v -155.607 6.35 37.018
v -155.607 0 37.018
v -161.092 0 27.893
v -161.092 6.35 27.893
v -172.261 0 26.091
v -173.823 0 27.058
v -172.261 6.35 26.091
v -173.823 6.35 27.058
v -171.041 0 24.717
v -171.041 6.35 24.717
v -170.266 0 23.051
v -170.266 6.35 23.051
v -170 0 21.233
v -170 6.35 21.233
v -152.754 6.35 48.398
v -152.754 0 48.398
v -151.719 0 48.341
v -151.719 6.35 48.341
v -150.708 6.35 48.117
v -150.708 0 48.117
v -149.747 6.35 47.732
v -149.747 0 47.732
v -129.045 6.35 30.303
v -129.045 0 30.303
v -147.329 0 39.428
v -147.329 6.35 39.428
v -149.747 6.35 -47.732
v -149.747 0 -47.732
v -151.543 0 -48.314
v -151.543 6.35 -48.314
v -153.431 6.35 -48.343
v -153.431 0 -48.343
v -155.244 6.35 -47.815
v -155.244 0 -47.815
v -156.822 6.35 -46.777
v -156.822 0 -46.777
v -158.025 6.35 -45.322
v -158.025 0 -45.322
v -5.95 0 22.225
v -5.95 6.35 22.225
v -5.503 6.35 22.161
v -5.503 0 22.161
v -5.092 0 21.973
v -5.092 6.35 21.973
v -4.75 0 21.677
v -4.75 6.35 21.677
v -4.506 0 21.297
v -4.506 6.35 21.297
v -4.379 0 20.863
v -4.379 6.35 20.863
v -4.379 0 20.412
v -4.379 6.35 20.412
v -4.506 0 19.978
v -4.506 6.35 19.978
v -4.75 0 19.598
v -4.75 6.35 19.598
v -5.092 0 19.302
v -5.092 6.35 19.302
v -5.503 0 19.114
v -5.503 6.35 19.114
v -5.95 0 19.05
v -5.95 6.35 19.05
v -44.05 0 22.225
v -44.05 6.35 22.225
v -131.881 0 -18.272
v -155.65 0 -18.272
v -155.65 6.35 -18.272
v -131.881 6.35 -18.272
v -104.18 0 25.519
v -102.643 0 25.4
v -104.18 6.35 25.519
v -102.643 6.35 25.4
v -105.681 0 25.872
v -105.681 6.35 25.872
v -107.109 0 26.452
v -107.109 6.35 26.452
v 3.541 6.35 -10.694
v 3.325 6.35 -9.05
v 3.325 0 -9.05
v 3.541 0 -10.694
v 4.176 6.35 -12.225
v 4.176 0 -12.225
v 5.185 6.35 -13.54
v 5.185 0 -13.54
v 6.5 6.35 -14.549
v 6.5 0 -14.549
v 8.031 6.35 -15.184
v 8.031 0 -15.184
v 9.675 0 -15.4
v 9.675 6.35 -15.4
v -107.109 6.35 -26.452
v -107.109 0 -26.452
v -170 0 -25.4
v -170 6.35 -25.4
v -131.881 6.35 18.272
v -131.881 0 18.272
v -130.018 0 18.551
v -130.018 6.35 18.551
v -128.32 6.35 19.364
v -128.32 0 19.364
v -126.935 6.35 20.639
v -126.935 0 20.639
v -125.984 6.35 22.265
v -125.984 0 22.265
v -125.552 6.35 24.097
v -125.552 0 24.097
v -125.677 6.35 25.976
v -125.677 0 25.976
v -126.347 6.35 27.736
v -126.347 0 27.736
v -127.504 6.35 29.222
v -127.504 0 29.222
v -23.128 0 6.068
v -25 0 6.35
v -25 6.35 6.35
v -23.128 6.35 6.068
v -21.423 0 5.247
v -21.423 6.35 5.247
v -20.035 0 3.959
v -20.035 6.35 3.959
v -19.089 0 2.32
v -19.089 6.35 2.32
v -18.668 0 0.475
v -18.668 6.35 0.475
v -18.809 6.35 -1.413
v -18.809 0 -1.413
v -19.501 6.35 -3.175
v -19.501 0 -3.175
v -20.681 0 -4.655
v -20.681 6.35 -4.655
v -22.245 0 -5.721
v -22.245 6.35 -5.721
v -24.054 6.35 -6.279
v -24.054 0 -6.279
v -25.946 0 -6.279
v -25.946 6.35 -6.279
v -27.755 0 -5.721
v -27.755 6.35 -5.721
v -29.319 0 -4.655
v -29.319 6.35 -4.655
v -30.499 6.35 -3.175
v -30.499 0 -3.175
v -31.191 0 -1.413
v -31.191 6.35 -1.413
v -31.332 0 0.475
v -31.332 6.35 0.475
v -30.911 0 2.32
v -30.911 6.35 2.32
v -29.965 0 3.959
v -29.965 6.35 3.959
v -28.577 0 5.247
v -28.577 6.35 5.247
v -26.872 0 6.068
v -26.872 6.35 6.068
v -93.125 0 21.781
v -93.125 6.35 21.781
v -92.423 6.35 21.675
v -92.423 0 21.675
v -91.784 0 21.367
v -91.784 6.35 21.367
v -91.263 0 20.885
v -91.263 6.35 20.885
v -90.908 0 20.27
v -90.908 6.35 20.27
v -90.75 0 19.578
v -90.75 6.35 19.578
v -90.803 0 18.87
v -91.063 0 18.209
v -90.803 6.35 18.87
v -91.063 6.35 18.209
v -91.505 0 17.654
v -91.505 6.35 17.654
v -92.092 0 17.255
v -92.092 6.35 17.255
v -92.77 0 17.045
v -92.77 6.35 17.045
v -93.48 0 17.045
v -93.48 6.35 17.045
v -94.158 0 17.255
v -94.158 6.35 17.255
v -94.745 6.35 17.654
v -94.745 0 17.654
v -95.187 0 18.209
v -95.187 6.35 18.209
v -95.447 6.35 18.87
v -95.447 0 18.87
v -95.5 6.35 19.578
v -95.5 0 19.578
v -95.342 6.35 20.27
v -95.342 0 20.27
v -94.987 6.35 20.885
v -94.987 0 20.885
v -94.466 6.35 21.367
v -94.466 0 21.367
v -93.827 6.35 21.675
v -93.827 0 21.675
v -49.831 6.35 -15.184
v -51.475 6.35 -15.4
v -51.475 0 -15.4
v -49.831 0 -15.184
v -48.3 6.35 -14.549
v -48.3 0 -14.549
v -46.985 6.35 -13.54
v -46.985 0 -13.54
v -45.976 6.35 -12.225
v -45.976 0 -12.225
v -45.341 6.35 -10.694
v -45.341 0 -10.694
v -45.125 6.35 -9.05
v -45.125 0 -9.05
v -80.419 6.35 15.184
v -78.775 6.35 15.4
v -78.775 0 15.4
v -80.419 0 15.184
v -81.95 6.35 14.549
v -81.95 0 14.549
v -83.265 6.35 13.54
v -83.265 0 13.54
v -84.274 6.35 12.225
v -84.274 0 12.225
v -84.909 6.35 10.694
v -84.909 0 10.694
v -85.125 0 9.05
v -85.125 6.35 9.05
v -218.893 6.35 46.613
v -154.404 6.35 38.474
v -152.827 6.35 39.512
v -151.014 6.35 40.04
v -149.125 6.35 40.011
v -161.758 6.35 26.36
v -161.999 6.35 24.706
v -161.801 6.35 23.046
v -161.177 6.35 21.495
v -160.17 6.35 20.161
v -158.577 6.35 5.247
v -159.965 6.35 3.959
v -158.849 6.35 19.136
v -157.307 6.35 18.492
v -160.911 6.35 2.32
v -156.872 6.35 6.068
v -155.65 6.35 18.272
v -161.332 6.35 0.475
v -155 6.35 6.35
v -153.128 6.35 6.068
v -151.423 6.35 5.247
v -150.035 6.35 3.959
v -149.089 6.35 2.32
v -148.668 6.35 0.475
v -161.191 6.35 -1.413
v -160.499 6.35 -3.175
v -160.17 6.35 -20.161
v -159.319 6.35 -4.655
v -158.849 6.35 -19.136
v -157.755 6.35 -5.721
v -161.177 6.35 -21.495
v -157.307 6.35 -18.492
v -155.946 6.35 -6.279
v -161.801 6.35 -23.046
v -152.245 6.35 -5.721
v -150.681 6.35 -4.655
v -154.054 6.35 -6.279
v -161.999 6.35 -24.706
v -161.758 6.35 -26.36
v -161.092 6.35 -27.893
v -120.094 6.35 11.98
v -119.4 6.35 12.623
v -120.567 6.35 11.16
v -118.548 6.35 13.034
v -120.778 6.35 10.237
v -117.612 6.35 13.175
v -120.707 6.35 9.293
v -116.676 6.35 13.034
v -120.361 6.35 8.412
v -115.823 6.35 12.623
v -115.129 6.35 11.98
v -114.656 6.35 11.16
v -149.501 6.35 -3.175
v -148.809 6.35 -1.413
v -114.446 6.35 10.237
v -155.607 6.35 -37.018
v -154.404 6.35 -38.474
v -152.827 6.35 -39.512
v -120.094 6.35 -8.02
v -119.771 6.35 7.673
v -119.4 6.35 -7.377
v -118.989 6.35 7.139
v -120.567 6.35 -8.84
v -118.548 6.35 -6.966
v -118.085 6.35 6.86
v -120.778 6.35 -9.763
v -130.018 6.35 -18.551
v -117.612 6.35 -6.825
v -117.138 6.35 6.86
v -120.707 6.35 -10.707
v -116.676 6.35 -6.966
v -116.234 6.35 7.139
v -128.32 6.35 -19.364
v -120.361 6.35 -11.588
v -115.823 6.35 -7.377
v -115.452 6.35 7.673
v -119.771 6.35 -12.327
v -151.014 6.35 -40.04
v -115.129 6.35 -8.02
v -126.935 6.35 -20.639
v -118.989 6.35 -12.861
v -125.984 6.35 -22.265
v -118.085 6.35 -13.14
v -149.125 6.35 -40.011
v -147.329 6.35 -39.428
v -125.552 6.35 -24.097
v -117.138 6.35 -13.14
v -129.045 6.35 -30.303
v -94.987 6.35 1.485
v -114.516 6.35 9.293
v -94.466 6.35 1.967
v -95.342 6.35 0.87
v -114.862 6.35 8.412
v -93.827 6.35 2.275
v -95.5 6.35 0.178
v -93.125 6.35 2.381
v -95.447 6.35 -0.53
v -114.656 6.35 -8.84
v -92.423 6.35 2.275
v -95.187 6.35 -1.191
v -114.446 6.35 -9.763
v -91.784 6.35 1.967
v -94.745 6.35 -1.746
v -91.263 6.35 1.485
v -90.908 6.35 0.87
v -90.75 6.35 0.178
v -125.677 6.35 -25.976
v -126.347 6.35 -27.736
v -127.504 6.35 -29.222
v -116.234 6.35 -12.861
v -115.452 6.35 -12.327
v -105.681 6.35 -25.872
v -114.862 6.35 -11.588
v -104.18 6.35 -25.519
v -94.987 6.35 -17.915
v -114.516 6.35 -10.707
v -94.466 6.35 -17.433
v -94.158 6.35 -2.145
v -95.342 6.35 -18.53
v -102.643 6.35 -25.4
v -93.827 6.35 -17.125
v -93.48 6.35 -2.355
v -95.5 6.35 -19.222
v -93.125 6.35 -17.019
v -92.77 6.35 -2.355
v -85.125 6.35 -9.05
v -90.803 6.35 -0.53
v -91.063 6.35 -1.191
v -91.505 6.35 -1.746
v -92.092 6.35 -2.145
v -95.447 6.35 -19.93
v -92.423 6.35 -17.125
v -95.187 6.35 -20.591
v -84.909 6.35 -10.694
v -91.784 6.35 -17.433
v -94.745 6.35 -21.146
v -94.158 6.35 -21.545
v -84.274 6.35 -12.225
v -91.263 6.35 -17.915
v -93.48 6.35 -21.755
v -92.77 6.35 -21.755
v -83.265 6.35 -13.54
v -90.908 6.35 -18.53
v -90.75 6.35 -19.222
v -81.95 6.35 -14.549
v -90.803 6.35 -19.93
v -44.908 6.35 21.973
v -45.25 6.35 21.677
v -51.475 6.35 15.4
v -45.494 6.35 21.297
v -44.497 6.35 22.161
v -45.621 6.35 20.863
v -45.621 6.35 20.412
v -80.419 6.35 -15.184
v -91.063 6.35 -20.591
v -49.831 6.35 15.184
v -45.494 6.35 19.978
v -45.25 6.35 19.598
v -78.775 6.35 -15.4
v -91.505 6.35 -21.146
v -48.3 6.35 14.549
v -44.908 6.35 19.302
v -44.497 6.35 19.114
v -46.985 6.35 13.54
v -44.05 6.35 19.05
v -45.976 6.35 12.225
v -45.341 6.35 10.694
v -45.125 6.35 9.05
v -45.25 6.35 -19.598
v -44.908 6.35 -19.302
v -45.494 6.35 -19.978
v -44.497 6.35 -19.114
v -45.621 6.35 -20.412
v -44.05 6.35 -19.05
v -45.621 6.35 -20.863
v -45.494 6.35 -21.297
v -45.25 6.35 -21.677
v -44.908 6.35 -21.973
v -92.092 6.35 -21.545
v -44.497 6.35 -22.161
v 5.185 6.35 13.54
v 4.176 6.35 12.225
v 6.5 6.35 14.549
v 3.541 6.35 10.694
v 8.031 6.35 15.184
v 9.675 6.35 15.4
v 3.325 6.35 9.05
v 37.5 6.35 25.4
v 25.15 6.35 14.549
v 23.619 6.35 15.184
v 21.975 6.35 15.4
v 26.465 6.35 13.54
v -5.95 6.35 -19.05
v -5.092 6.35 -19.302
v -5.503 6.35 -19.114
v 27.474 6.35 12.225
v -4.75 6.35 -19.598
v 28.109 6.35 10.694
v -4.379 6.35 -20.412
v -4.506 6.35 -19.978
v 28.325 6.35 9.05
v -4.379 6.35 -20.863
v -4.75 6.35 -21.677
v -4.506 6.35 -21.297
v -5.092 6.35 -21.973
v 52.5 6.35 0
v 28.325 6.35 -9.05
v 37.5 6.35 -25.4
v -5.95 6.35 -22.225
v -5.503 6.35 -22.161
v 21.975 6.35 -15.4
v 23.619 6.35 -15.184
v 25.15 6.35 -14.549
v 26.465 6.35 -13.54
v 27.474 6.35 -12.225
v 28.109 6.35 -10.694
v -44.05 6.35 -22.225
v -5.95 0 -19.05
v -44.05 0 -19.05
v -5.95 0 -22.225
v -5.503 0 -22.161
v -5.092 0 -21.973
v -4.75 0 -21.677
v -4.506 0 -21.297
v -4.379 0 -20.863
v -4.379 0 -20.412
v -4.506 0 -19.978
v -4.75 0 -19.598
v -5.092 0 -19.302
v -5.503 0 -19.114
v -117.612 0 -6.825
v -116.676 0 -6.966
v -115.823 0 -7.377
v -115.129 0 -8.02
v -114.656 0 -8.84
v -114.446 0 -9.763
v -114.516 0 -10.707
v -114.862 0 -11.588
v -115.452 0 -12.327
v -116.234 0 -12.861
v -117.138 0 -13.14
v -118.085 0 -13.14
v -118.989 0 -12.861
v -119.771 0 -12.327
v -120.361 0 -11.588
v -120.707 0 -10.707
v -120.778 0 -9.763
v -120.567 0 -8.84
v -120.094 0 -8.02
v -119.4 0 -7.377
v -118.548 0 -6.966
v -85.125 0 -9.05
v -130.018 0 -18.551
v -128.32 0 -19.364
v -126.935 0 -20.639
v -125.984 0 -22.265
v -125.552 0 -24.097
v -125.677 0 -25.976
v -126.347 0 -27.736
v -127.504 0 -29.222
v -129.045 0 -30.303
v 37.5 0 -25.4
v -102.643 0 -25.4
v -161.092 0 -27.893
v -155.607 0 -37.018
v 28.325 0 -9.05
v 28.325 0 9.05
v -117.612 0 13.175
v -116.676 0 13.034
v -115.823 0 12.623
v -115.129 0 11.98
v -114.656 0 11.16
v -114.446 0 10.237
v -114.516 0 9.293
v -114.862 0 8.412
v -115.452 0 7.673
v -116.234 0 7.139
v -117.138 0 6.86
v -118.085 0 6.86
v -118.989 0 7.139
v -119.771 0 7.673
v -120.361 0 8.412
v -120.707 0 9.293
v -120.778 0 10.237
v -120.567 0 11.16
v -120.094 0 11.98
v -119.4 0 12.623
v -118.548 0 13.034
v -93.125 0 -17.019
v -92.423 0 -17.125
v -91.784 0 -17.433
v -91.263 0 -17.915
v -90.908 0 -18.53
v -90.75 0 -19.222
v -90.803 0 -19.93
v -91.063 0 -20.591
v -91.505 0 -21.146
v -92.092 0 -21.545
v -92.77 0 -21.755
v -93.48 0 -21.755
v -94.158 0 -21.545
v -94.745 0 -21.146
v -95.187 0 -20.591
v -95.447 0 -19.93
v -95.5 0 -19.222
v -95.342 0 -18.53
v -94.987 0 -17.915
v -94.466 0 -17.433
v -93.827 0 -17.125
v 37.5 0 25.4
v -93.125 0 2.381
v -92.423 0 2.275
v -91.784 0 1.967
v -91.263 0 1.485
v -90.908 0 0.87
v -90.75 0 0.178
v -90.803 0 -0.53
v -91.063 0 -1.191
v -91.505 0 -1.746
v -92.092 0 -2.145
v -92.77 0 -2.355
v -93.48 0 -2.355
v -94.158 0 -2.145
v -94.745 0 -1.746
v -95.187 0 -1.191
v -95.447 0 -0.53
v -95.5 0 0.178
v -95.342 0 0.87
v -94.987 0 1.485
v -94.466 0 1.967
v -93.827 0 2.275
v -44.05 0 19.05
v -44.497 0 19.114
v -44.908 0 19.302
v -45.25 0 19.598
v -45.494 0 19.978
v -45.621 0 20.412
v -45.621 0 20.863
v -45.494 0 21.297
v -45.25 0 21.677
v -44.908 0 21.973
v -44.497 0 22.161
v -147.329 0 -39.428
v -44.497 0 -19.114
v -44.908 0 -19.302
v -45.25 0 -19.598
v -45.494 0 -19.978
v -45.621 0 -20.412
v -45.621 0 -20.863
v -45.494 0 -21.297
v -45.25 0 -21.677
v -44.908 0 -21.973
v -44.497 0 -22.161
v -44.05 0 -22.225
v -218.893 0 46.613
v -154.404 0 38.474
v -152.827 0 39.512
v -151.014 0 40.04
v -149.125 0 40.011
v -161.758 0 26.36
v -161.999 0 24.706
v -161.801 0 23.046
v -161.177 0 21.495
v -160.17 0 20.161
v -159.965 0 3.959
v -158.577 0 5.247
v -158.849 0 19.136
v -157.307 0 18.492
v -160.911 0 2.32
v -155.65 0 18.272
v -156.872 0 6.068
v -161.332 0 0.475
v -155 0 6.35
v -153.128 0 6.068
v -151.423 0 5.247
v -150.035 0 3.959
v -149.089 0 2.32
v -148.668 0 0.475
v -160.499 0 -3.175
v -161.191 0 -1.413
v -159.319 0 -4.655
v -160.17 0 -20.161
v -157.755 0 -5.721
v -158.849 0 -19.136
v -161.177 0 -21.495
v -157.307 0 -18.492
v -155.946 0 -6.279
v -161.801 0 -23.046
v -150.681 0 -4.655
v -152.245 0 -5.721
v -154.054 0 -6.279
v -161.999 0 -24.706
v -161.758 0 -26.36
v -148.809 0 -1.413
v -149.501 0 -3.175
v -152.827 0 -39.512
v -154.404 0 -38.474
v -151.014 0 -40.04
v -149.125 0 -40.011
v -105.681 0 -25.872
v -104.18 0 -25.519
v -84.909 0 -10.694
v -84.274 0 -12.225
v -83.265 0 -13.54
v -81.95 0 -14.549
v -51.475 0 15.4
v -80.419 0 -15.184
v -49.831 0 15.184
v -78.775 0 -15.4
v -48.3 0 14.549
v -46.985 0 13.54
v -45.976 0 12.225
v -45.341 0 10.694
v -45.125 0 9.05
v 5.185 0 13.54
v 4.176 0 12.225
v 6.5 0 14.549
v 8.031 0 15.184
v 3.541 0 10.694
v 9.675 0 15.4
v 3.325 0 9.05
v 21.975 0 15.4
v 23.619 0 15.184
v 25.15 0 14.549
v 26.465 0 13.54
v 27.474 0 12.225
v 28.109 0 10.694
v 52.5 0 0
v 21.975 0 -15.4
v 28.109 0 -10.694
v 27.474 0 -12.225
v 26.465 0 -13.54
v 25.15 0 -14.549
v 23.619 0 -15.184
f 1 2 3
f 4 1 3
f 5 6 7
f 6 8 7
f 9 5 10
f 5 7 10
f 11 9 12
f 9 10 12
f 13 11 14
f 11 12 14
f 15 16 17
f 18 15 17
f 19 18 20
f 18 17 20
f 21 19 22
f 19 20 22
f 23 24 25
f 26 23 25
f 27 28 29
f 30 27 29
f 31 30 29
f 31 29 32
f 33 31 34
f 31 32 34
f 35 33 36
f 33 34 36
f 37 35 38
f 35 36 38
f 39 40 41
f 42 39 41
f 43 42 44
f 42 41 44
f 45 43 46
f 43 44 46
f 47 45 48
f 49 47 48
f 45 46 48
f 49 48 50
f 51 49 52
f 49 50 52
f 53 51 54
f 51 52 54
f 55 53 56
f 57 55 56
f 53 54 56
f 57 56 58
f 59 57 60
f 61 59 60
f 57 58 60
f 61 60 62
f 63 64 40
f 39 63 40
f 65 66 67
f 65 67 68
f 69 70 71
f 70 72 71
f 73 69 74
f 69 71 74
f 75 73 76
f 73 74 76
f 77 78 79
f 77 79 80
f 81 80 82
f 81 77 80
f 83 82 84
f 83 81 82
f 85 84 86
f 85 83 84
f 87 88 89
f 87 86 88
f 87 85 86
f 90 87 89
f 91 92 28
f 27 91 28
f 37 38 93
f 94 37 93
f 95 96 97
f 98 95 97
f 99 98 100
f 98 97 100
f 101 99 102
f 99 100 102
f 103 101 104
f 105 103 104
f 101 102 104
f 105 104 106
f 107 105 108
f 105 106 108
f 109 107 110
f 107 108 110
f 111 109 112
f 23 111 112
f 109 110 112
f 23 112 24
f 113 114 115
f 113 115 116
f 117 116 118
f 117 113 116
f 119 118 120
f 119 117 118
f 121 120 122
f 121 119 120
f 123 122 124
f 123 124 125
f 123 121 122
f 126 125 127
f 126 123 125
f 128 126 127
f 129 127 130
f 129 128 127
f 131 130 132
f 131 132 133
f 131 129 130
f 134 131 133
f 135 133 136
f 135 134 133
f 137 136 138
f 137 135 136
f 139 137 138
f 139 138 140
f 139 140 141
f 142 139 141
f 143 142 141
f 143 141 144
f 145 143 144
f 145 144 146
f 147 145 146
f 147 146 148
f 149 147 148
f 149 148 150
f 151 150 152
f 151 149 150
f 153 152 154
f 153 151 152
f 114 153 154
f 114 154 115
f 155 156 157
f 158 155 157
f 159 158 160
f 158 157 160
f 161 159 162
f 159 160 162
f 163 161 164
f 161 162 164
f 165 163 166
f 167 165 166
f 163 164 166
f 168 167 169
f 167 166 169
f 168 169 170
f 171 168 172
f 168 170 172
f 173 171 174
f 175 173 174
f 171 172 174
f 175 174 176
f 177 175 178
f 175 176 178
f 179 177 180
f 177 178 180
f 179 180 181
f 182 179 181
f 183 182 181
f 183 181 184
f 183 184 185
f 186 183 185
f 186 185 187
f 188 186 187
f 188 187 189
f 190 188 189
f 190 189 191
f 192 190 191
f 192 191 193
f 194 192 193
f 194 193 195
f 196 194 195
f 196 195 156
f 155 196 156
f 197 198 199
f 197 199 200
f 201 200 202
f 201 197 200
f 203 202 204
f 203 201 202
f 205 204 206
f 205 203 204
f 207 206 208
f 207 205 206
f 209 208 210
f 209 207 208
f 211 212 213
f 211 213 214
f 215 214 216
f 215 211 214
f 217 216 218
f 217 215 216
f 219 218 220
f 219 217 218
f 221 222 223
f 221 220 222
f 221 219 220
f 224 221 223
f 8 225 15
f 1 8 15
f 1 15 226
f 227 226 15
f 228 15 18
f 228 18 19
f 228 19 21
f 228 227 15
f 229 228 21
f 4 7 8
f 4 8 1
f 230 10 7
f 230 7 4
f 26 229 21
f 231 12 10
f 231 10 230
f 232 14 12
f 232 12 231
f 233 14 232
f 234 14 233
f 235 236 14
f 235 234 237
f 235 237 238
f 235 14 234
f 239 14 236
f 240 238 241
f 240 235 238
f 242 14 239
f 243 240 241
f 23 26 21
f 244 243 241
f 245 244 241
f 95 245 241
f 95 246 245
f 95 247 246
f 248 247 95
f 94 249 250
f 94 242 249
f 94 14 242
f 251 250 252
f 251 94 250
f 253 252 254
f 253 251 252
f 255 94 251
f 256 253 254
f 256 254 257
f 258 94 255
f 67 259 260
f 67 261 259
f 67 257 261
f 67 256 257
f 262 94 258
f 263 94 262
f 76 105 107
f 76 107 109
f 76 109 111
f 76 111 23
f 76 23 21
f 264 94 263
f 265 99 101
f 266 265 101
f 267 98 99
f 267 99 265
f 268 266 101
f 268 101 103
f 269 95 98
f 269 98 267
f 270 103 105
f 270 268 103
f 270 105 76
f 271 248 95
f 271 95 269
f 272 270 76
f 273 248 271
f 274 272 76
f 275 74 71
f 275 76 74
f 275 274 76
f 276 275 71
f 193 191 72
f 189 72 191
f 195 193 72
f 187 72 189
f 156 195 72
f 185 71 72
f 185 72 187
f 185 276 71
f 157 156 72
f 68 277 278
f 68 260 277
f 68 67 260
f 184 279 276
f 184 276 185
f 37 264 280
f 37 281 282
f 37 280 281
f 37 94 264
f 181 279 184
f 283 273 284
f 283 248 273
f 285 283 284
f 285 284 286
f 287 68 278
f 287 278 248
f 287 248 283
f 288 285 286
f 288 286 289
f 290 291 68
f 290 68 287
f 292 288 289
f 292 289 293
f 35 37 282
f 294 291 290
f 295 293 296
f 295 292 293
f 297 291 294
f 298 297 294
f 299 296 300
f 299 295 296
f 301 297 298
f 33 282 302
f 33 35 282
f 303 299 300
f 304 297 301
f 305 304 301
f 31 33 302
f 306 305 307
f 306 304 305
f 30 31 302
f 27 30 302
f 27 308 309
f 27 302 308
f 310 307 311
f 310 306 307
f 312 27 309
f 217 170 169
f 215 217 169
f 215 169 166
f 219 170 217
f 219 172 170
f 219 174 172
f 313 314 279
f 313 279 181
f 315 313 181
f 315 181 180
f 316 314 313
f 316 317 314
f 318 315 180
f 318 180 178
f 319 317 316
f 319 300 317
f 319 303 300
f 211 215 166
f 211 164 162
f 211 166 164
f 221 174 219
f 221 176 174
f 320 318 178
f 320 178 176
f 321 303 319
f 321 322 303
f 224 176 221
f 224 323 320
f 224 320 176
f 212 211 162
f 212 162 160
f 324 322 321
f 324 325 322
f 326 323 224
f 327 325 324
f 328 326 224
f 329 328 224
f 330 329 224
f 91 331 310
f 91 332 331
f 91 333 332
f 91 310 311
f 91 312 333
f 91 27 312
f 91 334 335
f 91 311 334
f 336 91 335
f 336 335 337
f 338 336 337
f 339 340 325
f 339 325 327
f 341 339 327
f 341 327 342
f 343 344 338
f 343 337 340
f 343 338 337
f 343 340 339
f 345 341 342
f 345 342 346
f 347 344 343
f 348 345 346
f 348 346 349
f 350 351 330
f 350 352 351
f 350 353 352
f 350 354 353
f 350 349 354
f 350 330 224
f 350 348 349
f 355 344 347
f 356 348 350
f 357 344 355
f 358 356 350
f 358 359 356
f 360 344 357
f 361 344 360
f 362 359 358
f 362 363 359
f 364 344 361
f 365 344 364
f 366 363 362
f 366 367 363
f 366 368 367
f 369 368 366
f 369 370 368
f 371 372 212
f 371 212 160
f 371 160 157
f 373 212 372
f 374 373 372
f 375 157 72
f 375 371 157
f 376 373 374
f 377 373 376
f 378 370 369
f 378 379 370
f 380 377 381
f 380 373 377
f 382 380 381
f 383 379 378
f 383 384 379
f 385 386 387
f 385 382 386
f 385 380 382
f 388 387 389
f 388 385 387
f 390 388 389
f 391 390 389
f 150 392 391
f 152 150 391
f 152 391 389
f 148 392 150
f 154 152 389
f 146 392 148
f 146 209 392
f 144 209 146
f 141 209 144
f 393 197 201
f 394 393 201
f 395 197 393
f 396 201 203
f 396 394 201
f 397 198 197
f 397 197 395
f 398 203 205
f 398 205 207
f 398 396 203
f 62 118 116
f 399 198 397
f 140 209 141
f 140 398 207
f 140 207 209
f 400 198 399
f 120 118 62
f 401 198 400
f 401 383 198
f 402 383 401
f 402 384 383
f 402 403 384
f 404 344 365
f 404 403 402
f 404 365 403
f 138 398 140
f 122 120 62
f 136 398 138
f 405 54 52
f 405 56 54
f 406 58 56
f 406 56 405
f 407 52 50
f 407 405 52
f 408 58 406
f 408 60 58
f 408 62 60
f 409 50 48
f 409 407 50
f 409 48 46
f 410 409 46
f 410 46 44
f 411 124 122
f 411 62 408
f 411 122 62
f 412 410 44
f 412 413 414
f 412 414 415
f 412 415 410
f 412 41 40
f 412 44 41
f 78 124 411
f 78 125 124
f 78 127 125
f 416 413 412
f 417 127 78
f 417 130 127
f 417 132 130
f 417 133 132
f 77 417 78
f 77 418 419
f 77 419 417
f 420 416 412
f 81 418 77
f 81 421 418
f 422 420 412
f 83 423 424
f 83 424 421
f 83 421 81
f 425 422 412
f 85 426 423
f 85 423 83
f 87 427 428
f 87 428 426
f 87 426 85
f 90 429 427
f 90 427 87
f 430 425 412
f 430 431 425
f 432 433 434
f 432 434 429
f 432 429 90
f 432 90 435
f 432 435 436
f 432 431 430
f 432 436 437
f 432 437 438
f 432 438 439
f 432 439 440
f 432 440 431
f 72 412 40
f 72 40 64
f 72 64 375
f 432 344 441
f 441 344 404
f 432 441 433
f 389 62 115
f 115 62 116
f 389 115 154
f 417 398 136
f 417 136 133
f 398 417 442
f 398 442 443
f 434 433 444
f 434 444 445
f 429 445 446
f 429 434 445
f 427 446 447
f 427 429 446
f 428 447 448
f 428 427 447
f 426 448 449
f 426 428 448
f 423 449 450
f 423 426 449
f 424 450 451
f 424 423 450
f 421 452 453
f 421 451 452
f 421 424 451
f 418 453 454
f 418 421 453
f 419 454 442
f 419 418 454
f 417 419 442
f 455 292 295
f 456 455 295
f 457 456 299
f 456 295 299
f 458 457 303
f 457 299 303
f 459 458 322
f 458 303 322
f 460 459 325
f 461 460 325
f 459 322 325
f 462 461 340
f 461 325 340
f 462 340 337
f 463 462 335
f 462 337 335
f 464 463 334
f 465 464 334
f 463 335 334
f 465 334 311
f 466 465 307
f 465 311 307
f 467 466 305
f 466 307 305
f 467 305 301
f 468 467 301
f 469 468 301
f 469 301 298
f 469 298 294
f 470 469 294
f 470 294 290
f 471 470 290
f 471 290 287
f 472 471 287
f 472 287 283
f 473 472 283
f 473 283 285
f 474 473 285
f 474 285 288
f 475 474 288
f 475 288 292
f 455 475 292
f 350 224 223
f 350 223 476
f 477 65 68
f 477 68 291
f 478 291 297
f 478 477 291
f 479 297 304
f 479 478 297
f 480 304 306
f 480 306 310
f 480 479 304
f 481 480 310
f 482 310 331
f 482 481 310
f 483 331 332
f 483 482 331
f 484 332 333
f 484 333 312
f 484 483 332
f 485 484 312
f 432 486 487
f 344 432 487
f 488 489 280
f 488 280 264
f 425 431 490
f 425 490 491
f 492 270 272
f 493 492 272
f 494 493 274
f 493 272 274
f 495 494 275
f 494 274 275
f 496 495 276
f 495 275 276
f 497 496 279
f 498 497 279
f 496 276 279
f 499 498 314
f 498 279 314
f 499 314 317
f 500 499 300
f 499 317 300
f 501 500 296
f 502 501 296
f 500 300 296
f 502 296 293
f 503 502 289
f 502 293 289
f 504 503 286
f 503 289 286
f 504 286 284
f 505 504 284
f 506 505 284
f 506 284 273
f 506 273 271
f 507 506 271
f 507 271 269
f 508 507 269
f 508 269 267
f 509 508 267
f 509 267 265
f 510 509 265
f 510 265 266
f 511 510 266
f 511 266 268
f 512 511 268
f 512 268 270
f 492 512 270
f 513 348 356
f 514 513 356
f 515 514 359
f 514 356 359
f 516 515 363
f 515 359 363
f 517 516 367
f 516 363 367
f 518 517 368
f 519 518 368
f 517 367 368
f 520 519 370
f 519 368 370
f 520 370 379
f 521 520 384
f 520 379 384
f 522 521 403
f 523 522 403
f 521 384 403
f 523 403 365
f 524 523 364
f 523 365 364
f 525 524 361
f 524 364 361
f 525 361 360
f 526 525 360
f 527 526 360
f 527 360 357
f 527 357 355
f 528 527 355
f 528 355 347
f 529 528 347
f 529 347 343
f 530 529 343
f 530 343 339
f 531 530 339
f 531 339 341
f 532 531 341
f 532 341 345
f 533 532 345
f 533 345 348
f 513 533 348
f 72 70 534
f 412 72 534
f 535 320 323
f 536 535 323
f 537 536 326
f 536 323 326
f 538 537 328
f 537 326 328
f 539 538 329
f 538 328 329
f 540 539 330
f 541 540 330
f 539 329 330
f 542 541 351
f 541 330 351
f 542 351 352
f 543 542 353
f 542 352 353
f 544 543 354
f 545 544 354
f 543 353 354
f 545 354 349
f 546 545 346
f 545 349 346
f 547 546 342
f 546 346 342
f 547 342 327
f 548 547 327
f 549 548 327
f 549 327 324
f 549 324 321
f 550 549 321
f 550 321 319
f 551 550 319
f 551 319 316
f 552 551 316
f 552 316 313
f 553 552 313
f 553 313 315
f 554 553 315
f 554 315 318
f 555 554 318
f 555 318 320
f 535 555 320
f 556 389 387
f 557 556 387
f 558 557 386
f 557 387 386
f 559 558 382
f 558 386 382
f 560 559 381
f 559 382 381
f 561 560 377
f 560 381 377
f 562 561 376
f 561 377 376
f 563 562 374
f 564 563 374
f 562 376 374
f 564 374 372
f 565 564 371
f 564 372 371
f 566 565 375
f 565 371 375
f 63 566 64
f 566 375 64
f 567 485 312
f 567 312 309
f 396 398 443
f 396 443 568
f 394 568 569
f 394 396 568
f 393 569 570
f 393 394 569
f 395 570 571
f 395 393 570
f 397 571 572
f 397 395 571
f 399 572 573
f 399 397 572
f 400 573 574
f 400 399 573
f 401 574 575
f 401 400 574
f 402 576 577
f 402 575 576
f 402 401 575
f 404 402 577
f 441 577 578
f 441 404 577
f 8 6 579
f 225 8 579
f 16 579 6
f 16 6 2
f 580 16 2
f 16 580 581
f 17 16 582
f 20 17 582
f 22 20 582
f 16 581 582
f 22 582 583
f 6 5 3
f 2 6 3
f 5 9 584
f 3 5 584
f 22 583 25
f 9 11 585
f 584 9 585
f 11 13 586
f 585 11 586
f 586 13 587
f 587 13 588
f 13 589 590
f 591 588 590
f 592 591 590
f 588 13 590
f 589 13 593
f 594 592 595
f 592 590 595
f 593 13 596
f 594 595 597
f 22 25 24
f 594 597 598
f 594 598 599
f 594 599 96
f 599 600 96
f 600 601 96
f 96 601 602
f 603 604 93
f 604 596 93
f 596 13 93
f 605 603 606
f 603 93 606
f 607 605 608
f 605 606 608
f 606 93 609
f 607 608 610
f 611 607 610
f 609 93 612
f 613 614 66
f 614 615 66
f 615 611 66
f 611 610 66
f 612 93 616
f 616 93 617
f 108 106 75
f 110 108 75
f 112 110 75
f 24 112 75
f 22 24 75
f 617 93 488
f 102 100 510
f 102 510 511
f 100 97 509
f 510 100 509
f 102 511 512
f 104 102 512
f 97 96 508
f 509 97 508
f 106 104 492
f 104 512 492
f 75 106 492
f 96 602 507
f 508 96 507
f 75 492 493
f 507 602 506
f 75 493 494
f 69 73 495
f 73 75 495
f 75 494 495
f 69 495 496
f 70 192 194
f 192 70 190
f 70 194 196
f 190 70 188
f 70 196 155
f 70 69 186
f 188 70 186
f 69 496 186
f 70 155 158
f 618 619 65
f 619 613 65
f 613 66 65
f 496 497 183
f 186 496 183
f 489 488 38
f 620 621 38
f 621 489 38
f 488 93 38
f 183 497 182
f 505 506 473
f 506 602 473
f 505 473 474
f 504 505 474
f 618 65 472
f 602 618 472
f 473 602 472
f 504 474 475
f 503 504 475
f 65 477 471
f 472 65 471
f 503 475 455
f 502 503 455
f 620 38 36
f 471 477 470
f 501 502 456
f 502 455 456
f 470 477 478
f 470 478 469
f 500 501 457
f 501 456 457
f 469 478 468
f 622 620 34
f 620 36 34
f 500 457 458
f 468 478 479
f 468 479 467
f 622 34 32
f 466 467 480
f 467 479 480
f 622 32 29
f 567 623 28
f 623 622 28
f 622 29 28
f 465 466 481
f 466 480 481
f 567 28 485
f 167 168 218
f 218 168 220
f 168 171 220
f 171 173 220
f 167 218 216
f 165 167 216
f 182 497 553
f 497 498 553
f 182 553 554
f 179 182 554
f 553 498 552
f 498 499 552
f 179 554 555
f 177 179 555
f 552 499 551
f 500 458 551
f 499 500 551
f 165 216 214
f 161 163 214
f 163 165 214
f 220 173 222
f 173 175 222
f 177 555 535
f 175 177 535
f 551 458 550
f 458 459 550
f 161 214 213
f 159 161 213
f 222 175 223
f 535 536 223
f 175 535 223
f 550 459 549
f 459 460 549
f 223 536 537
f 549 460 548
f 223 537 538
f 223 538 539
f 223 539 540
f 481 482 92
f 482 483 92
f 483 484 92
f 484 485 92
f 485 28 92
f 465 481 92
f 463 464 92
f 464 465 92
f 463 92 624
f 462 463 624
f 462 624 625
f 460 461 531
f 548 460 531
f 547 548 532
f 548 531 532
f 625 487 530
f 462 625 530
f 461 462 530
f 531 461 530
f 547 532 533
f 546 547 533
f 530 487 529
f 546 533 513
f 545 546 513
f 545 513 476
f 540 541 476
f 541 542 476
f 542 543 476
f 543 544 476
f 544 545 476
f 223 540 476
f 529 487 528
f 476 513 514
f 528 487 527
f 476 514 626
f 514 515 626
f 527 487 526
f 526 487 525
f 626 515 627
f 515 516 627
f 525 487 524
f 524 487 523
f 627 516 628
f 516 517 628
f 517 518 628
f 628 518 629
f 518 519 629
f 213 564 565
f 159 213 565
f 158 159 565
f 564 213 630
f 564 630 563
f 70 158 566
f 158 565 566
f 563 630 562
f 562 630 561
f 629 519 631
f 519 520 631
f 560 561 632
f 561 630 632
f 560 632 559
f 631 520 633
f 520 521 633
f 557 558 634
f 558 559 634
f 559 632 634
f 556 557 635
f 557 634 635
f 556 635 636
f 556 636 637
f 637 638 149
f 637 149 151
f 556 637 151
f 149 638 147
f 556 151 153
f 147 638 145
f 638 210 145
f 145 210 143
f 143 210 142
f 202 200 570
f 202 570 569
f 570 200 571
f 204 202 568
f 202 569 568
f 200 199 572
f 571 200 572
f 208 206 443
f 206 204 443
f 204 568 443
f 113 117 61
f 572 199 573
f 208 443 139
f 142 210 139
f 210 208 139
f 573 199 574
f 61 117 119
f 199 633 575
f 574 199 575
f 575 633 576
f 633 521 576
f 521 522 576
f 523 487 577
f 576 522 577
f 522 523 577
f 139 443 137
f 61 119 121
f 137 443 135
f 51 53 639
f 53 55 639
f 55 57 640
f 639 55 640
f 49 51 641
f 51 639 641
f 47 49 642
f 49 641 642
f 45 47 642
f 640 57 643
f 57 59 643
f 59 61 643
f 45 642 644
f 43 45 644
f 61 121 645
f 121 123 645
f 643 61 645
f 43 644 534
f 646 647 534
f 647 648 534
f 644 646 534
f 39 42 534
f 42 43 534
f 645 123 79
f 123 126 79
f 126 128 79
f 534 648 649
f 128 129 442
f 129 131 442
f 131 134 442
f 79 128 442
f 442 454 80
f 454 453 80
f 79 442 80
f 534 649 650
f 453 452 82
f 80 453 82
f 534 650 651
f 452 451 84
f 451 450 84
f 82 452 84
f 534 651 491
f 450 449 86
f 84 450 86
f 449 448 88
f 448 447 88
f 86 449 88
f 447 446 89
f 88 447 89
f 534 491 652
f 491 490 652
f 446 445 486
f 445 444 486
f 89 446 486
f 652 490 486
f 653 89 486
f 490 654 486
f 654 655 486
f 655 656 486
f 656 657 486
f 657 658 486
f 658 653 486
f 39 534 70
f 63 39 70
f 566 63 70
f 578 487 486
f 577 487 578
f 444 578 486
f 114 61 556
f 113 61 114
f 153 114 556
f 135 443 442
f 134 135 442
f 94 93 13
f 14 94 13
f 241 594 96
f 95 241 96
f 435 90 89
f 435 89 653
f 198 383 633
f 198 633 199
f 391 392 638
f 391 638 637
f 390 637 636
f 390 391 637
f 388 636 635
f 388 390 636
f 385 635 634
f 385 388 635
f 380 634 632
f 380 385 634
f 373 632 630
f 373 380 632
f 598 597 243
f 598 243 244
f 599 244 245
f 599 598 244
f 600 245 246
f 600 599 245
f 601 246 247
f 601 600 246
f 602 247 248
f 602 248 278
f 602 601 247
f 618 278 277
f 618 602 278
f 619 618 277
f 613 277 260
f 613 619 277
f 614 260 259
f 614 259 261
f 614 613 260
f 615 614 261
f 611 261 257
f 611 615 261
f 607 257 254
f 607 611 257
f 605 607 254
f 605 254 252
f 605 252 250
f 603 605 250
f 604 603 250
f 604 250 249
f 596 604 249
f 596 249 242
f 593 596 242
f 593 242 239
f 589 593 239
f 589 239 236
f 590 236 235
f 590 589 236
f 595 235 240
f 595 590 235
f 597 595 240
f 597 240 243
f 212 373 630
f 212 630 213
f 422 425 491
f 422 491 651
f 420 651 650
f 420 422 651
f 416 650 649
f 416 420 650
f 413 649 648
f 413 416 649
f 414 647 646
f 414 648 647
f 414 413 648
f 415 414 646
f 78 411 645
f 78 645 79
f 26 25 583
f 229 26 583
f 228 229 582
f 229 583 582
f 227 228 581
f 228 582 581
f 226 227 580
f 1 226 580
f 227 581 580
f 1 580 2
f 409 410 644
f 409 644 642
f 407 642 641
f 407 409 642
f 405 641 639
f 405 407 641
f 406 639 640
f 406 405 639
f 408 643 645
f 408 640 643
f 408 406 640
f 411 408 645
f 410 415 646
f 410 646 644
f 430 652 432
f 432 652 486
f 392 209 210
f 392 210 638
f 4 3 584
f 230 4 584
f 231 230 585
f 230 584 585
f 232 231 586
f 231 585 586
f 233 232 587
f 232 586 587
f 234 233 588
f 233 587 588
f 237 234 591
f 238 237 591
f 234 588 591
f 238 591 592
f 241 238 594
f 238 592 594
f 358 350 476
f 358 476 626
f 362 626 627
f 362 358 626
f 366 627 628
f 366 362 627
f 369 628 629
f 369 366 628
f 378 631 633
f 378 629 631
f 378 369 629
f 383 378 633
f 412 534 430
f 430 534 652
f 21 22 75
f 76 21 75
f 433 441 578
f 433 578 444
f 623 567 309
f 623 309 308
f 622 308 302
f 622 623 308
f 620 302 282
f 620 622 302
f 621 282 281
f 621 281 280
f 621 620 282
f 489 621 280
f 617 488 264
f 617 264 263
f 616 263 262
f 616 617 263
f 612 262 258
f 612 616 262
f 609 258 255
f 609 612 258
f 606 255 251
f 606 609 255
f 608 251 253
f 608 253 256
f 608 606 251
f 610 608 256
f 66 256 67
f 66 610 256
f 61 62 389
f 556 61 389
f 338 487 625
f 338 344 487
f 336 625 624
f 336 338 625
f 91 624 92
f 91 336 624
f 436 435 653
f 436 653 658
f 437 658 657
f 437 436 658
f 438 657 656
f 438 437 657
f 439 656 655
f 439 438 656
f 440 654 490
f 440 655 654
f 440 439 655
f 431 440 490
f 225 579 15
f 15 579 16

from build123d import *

# Parameters (mm, degrees)
CROQUIS1_R              = 6.35
SALIENTE_EXTRUIR1_DEPTH = 6.35
CORTAR_EXTRUIR2_DEPTH   = 225.270156497
CORTAR_EXTRUIR3_DEPTH   = 225.270156497
REDONDEO1_R             = 10
CROQUIS8_R              = 2.38125
CORTAR_EXTRUIR4_DEPTH   = 225.270156497
REDONDEO2_R             = 6.35
CROQUIS10_R             = 3.175
CORTAR_EXTRUIR6_DEPTH   = 225.270156497


with BuildPart() as part:
    # Croquis1 → Saliente-Extruir1 (new body)
    with BuildSketch(Plane(origin=(0, 0, 0), x_dir=(1, 0, 0), z_dir=(0, 1, 0))):
        with BuildLine():
            Line((37.5, -25.4), (52.5, 0))
            Line((52.5, 0), (37.5, 25.4))
            Line((37.5, 25.4), (-105, 25.4))
            Line((-105, 25.4), (-149.746813481, 47.731727951))
            ThreePointArc((-149.746813481, 47.731727951), (-154.357530471, 48.146831931), (-158.024774803, 45.321528145))
            Line((-158.024774803, 45.321528145), (-170, 25.4))
            Line((-170, 25.4), (-170, -25.4))
            Line((-170, -25.4), (-218.893171651, -46.613192851))
            Line((-218.893171651, -46.613192851), (-152.75365104, -48.397689977))
            ThreePointArc((-152.75365104, -48.397689977), (-151.209247261, -48.24975741), (-149.746813481, -47.731727951))
            Line((-149.746813481, -47.731727951), (-105, -25.4))
            Line((-105, -25.4), (37.5, -25.4))
        make_face()
        with Locations(Location((-155, 0, 0), (0, 0, 270))):
            Circle(CROQUIS1_R, mode=Mode.SUBTRACT)
        with Locations(Location((-25, 0, 0), (0, 0, 270))):
            Circle(CROQUIS1_R, mode=Mode.SUBTRACT)
        with BuildLine():
            Line((-129.045100716, 30.303281185), (-147.329198773, 39.428299747))
            ThreePointArc((-147.329198773, 39.428299747), (-151.939915763, 39.843403727), (-155.607160095, 37.018099941))
            Line((-155.607160095, 37.018099941), (-161.092389512, 27.893081378))
            ThreePointArc((-161.092389512, 27.893081378), (-161.177056347, 21.495189828), (-155.65, 18.271553233))
            Line((-155.65, 18.271553233), (-131.880672526, 18.271553233))
            ThreePointArc((-131.880672526, 18.271553233), (-125.699998109, 23.164925706), (-129.045100716, 30.303281185))
        make_face(mode=Mode.SUBTRACT)
        with BuildLine():
            Line((-129.045100716, -30.303281185), (-147.329198773, -39.428299747))
            ThreePointArc((-147.329198773, -39.428299747), (-151.939915763, -39.843403727), (-155.607160095, -37.018099941))
            Line((-155.607160095, -37.018099941), (-161.092389512, -27.893081378))
            ThreePointArc((-161.092389512, -27.893081378), (-161.177056347, -21.495189828), (-155.65, -18.271553233))
            Line((-155.65, -18.271553233), (-131.880672526, -18.271553233))
            ThreePointArc((-131.880672526, -18.271553233), (-125.699998109, -23.164925706), (-129.045100716, -30.303281185))
        make_face(mode=Mode.SUBTRACT)
    extrude(amount=SALIENTE_EXTRUIR1_DEPTH)

    # Croquis5 → Cortar-Extruir2 (cut, through all)
    with BuildSketch(Plane(origin=(0, 6.35, 0), x_dir=(1, 0, 0), z_dir=(0, 1, 0))):
        with BuildLine():
            Line((-44.05, 22.225), (-5.95, 22.225))
            ThreePointArc((-5.95, 22.225), (-4.3625, 20.6375), (-5.95, 19.05))
            Line((-5.95, 19.05), (-44.05, 19.05))
            ThreePointArc((-44.05, 19.05), (-45.6375, 20.6375), (-44.05, 22.225))
        make_face()
        with BuildLine():
            Line((-5.95, -19.05), (-44.05, -19.05))
            ThreePointArc((-44.05, -19.05), (-45.6375, -20.6375), (-44.05, -22.225))
            Line((-44.05, -22.225), (-5.95, -22.225))
            ThreePointArc((-5.95, -22.225), (-4.3625, -20.6375), (-5.95, -19.05))
        make_face()
    extrude(amount=-CORTAR_EXTRUIR2_DEPTH, mode=Mode.SUBTRACT)

    # Croquis7 → Cortar-Extruir3 (cut, through all)
    with BuildSketch(Plane(origin=(0, 6.35, 0), x_dir=(1, 0, 0), z_dir=(0, 1, 0))):
        with BuildLine():
            Line((-78.775, 15.4), (-51.475, 15.4))
            ThreePointArc((-51.475, 15.4), (-46.984871939, 13.540128061), (-45.125, 9.05))
            Line((-45.125, 9.05), (-45.125, -9.05))
            ThreePointArc((-45.125, -9.05), (-46.984871939, -13.540128061), (-51.475, -15.4))
            Line((-51.475, -15.4), (-78.775, -15.4))
            ThreePointArc((-78.775, -15.4), (-83.265128061, -13.540128061), (-85.125, -9.05))
            Line((-85.125, -9.05), (-85.125, 9.05))
            ThreePointArc((-85.125, 9.05), (-83.265128061, 13.540128061), (-78.775, 15.4))
        make_face()
        with BuildLine():
            Line((9.675, 15.4), (21.975, 15.4))
            ThreePointArc((21.975, 15.4), (26.465128061, 13.540128061), (28.325, 9.05))
            Line((28.325, 9.05), (28.325, -9.05))
            ThreePointArc((28.325, -9.05), (26.465128061, -13.540128061), (21.975, -15.4))
            Line((21.975, -15.4), (9.675, -15.4))
            ThreePointArc((9.675, -15.4), (5.184871939, -13.540128061), (3.325, -9.05))
            Line((3.325, -9.05), (3.325, 9.05))
            ThreePointArc((3.325, 9.05), (5.184871939, 13.540128061), (9.675, 15.4))
        make_face()
    extrude(amount=-CORTAR_EXTRUIR3_DEPTH, mode=Mode.SUBTRACT)

    # Redondeo1
    redondeo1_edges = [part.edges().sort_by_distance(p)[0] for p in [
        (-105, 3.175, 25.4),
        (-105, 3.175, -25.4),
    ]]
    fillet(redondeo1_edges, radius=REDONDEO1_R)

    # Croquis8 → Cortar-Extruir4 (cut, through all)
    with BuildSketch(Plane(origin=(0, 6.35, 0), x_dir=(1, 0, 0), z_dir=(0, 1, 0))):
        with Locations(Location((-93.125, 0, 0), (0, 0, 270))):
            Circle(CROQUIS8_R)
        with Locations(Location((-93.125, 19.4, 0), (0, 0, 270))):
            Circle(CROQUIS8_R)
        with Locations(Location((-93.125, -19.4, 0), (0, 0, 270))):
            Circle(CROQUIS8_R)
    extrude(amount=-CORTAR_EXTRUIR4_DEPTH, mode=Mode.SUBTRACT)

    # Redondeo2
    redondeo2_edges = [part.edges().sort_by_distance(p)[0] for p in [
        (-170, 3.175, 25.4),
    ]]
    fillet(redondeo2_edges, radius=REDONDEO2_R)

    # Croquis10 → Cortar-Extruir6 (cut, through all)
    with BuildSketch(Plane(origin=(0, 6.35, 0), x_dir=(1, 0, 0), z_dir=(0, 1, 0))):
        with Locations(Location((-117.61165924, -10, 0), (0, 0, 270))):
            Circle(CROQUIS10_R)
        with Locations(Location((-117.61165924, 10, 0), (0, 0, 270))):
            Circle(CROQUIS10_R)
    extrude(amount=-CORTAR_EXTRUIR6_DEPTH, mode=Mode.SUBTRACT)


solid = part.part
